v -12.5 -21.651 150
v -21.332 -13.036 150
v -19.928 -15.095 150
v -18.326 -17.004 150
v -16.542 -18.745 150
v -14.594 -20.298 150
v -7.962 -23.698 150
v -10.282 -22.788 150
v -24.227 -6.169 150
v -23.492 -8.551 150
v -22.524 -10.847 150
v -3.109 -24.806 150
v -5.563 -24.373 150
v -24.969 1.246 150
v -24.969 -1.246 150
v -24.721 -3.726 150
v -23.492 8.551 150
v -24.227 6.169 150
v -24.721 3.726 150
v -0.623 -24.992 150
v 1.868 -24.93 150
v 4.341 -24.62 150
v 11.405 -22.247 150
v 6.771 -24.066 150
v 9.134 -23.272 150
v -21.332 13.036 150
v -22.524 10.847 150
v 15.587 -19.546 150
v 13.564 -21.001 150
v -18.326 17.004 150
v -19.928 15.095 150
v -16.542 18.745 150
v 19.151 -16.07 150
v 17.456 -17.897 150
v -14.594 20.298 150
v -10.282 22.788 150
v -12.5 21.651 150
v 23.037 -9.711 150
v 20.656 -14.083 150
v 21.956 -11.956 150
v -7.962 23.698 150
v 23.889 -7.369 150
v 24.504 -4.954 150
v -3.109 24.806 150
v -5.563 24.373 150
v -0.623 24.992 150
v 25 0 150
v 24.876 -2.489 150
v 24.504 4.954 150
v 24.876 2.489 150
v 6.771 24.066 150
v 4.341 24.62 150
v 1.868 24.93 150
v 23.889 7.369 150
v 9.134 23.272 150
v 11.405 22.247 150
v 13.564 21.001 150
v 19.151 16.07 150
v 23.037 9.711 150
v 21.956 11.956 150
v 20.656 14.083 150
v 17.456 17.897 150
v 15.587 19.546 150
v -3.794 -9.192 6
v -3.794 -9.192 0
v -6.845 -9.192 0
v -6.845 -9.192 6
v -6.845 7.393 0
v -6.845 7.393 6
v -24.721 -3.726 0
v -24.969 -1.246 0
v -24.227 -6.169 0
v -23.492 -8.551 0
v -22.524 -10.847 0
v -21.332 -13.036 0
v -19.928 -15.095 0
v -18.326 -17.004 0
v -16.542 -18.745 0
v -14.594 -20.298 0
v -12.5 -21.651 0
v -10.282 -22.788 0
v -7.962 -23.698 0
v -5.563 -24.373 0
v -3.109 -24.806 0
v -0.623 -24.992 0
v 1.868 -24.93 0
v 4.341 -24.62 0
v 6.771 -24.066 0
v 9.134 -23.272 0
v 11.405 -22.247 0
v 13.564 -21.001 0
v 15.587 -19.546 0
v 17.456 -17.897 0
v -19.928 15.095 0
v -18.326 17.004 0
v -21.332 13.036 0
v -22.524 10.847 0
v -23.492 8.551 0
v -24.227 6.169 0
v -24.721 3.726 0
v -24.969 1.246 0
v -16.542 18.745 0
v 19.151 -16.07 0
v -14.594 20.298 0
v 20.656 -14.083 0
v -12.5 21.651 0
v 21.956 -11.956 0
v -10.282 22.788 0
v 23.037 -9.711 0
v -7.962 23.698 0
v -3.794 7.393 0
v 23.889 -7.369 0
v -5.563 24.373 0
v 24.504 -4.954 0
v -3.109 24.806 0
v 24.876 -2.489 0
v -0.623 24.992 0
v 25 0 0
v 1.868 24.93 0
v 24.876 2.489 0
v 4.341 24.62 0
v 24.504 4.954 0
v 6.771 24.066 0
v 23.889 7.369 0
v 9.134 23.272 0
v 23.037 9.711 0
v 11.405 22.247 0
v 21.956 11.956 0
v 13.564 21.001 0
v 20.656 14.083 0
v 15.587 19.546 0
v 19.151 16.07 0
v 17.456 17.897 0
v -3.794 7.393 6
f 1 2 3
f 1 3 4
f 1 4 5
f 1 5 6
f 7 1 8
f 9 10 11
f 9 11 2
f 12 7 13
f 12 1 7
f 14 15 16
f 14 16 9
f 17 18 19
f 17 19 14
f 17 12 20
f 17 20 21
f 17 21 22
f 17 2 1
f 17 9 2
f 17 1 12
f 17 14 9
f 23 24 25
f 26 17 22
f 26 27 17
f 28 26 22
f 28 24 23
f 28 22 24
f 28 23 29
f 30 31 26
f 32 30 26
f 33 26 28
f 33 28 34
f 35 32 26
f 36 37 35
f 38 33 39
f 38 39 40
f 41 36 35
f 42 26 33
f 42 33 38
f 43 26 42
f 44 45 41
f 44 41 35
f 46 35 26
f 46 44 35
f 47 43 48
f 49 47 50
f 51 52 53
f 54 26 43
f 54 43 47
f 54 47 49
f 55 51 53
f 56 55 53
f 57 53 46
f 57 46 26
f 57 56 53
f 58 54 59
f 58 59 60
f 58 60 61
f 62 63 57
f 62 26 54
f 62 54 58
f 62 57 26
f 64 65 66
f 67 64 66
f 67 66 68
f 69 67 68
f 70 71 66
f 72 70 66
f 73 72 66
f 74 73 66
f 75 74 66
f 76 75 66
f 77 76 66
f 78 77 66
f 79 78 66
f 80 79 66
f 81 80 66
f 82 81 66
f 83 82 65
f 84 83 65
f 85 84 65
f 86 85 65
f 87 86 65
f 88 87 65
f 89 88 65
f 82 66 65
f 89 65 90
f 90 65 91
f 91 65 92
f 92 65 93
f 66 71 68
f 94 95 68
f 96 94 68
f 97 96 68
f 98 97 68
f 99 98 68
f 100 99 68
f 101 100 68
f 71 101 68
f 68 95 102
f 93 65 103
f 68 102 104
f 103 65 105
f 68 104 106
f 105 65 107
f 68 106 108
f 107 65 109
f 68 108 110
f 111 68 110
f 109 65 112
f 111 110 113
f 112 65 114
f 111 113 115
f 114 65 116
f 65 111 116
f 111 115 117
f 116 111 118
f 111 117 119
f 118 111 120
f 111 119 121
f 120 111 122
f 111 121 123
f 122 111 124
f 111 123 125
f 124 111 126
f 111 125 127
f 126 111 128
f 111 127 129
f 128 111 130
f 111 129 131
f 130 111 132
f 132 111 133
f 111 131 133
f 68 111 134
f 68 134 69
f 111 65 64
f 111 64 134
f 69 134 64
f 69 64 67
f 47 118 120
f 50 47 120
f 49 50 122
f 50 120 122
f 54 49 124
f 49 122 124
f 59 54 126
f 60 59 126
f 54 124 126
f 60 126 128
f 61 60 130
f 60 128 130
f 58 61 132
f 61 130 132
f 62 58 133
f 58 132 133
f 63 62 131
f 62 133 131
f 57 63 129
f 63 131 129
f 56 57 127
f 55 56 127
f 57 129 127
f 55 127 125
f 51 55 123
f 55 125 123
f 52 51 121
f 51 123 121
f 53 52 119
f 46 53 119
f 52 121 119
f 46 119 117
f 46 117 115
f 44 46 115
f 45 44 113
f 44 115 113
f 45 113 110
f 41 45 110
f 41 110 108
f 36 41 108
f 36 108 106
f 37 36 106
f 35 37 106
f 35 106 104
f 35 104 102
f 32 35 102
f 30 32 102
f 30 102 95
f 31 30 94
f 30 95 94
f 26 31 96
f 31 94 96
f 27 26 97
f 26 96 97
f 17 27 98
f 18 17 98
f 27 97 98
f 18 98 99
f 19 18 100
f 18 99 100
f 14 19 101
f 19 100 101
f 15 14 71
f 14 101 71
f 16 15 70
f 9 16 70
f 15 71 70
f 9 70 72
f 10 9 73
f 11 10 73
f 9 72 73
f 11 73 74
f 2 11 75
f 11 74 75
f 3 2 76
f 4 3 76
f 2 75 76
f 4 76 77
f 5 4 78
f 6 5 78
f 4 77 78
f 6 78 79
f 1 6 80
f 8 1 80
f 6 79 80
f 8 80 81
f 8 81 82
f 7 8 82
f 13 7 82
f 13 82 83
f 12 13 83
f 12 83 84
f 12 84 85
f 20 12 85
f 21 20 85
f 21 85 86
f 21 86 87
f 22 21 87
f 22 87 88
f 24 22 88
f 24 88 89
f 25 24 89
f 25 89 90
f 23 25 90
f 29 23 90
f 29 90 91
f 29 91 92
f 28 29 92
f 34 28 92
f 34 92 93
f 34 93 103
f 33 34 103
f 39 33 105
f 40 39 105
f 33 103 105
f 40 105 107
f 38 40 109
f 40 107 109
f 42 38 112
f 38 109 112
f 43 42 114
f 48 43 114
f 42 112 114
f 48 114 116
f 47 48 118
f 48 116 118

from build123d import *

# Parameters (mm, degrees)
SKETCH_1_R          = 25
EXTRUDE_1_DEPTH     = 150
SKETCH_2_W          = 3.051064085
SKETCH_2_H          = 16.585271438
CUT_EXTRUDE_1_DEPTH = 6


with BuildPart() as part:
    # 草图1 → 凸台-拉伸1 (new body)
    with BuildSketch(Plane.XY):
        Circle(SKETCH_1_R)
    extrude(amount=EXTRUDE_1_DEPTH)

    # 草图2 → 切除-拉伸1 (cut)
    with BuildSketch(Plane(origin=(0, 0, 0), x_dir=(-1, 0, 0), z_dir=(0, 0, -1))):
        with Locations((5.319804046, -0.899672743)):
            Rectangle(SKETCH_2_W, SKETCH_2_H)
    extrude(amount=-CUT_EXTRUDE_1_DEPTH, mode=Mode.SUBTRACT)


solid = part.part
